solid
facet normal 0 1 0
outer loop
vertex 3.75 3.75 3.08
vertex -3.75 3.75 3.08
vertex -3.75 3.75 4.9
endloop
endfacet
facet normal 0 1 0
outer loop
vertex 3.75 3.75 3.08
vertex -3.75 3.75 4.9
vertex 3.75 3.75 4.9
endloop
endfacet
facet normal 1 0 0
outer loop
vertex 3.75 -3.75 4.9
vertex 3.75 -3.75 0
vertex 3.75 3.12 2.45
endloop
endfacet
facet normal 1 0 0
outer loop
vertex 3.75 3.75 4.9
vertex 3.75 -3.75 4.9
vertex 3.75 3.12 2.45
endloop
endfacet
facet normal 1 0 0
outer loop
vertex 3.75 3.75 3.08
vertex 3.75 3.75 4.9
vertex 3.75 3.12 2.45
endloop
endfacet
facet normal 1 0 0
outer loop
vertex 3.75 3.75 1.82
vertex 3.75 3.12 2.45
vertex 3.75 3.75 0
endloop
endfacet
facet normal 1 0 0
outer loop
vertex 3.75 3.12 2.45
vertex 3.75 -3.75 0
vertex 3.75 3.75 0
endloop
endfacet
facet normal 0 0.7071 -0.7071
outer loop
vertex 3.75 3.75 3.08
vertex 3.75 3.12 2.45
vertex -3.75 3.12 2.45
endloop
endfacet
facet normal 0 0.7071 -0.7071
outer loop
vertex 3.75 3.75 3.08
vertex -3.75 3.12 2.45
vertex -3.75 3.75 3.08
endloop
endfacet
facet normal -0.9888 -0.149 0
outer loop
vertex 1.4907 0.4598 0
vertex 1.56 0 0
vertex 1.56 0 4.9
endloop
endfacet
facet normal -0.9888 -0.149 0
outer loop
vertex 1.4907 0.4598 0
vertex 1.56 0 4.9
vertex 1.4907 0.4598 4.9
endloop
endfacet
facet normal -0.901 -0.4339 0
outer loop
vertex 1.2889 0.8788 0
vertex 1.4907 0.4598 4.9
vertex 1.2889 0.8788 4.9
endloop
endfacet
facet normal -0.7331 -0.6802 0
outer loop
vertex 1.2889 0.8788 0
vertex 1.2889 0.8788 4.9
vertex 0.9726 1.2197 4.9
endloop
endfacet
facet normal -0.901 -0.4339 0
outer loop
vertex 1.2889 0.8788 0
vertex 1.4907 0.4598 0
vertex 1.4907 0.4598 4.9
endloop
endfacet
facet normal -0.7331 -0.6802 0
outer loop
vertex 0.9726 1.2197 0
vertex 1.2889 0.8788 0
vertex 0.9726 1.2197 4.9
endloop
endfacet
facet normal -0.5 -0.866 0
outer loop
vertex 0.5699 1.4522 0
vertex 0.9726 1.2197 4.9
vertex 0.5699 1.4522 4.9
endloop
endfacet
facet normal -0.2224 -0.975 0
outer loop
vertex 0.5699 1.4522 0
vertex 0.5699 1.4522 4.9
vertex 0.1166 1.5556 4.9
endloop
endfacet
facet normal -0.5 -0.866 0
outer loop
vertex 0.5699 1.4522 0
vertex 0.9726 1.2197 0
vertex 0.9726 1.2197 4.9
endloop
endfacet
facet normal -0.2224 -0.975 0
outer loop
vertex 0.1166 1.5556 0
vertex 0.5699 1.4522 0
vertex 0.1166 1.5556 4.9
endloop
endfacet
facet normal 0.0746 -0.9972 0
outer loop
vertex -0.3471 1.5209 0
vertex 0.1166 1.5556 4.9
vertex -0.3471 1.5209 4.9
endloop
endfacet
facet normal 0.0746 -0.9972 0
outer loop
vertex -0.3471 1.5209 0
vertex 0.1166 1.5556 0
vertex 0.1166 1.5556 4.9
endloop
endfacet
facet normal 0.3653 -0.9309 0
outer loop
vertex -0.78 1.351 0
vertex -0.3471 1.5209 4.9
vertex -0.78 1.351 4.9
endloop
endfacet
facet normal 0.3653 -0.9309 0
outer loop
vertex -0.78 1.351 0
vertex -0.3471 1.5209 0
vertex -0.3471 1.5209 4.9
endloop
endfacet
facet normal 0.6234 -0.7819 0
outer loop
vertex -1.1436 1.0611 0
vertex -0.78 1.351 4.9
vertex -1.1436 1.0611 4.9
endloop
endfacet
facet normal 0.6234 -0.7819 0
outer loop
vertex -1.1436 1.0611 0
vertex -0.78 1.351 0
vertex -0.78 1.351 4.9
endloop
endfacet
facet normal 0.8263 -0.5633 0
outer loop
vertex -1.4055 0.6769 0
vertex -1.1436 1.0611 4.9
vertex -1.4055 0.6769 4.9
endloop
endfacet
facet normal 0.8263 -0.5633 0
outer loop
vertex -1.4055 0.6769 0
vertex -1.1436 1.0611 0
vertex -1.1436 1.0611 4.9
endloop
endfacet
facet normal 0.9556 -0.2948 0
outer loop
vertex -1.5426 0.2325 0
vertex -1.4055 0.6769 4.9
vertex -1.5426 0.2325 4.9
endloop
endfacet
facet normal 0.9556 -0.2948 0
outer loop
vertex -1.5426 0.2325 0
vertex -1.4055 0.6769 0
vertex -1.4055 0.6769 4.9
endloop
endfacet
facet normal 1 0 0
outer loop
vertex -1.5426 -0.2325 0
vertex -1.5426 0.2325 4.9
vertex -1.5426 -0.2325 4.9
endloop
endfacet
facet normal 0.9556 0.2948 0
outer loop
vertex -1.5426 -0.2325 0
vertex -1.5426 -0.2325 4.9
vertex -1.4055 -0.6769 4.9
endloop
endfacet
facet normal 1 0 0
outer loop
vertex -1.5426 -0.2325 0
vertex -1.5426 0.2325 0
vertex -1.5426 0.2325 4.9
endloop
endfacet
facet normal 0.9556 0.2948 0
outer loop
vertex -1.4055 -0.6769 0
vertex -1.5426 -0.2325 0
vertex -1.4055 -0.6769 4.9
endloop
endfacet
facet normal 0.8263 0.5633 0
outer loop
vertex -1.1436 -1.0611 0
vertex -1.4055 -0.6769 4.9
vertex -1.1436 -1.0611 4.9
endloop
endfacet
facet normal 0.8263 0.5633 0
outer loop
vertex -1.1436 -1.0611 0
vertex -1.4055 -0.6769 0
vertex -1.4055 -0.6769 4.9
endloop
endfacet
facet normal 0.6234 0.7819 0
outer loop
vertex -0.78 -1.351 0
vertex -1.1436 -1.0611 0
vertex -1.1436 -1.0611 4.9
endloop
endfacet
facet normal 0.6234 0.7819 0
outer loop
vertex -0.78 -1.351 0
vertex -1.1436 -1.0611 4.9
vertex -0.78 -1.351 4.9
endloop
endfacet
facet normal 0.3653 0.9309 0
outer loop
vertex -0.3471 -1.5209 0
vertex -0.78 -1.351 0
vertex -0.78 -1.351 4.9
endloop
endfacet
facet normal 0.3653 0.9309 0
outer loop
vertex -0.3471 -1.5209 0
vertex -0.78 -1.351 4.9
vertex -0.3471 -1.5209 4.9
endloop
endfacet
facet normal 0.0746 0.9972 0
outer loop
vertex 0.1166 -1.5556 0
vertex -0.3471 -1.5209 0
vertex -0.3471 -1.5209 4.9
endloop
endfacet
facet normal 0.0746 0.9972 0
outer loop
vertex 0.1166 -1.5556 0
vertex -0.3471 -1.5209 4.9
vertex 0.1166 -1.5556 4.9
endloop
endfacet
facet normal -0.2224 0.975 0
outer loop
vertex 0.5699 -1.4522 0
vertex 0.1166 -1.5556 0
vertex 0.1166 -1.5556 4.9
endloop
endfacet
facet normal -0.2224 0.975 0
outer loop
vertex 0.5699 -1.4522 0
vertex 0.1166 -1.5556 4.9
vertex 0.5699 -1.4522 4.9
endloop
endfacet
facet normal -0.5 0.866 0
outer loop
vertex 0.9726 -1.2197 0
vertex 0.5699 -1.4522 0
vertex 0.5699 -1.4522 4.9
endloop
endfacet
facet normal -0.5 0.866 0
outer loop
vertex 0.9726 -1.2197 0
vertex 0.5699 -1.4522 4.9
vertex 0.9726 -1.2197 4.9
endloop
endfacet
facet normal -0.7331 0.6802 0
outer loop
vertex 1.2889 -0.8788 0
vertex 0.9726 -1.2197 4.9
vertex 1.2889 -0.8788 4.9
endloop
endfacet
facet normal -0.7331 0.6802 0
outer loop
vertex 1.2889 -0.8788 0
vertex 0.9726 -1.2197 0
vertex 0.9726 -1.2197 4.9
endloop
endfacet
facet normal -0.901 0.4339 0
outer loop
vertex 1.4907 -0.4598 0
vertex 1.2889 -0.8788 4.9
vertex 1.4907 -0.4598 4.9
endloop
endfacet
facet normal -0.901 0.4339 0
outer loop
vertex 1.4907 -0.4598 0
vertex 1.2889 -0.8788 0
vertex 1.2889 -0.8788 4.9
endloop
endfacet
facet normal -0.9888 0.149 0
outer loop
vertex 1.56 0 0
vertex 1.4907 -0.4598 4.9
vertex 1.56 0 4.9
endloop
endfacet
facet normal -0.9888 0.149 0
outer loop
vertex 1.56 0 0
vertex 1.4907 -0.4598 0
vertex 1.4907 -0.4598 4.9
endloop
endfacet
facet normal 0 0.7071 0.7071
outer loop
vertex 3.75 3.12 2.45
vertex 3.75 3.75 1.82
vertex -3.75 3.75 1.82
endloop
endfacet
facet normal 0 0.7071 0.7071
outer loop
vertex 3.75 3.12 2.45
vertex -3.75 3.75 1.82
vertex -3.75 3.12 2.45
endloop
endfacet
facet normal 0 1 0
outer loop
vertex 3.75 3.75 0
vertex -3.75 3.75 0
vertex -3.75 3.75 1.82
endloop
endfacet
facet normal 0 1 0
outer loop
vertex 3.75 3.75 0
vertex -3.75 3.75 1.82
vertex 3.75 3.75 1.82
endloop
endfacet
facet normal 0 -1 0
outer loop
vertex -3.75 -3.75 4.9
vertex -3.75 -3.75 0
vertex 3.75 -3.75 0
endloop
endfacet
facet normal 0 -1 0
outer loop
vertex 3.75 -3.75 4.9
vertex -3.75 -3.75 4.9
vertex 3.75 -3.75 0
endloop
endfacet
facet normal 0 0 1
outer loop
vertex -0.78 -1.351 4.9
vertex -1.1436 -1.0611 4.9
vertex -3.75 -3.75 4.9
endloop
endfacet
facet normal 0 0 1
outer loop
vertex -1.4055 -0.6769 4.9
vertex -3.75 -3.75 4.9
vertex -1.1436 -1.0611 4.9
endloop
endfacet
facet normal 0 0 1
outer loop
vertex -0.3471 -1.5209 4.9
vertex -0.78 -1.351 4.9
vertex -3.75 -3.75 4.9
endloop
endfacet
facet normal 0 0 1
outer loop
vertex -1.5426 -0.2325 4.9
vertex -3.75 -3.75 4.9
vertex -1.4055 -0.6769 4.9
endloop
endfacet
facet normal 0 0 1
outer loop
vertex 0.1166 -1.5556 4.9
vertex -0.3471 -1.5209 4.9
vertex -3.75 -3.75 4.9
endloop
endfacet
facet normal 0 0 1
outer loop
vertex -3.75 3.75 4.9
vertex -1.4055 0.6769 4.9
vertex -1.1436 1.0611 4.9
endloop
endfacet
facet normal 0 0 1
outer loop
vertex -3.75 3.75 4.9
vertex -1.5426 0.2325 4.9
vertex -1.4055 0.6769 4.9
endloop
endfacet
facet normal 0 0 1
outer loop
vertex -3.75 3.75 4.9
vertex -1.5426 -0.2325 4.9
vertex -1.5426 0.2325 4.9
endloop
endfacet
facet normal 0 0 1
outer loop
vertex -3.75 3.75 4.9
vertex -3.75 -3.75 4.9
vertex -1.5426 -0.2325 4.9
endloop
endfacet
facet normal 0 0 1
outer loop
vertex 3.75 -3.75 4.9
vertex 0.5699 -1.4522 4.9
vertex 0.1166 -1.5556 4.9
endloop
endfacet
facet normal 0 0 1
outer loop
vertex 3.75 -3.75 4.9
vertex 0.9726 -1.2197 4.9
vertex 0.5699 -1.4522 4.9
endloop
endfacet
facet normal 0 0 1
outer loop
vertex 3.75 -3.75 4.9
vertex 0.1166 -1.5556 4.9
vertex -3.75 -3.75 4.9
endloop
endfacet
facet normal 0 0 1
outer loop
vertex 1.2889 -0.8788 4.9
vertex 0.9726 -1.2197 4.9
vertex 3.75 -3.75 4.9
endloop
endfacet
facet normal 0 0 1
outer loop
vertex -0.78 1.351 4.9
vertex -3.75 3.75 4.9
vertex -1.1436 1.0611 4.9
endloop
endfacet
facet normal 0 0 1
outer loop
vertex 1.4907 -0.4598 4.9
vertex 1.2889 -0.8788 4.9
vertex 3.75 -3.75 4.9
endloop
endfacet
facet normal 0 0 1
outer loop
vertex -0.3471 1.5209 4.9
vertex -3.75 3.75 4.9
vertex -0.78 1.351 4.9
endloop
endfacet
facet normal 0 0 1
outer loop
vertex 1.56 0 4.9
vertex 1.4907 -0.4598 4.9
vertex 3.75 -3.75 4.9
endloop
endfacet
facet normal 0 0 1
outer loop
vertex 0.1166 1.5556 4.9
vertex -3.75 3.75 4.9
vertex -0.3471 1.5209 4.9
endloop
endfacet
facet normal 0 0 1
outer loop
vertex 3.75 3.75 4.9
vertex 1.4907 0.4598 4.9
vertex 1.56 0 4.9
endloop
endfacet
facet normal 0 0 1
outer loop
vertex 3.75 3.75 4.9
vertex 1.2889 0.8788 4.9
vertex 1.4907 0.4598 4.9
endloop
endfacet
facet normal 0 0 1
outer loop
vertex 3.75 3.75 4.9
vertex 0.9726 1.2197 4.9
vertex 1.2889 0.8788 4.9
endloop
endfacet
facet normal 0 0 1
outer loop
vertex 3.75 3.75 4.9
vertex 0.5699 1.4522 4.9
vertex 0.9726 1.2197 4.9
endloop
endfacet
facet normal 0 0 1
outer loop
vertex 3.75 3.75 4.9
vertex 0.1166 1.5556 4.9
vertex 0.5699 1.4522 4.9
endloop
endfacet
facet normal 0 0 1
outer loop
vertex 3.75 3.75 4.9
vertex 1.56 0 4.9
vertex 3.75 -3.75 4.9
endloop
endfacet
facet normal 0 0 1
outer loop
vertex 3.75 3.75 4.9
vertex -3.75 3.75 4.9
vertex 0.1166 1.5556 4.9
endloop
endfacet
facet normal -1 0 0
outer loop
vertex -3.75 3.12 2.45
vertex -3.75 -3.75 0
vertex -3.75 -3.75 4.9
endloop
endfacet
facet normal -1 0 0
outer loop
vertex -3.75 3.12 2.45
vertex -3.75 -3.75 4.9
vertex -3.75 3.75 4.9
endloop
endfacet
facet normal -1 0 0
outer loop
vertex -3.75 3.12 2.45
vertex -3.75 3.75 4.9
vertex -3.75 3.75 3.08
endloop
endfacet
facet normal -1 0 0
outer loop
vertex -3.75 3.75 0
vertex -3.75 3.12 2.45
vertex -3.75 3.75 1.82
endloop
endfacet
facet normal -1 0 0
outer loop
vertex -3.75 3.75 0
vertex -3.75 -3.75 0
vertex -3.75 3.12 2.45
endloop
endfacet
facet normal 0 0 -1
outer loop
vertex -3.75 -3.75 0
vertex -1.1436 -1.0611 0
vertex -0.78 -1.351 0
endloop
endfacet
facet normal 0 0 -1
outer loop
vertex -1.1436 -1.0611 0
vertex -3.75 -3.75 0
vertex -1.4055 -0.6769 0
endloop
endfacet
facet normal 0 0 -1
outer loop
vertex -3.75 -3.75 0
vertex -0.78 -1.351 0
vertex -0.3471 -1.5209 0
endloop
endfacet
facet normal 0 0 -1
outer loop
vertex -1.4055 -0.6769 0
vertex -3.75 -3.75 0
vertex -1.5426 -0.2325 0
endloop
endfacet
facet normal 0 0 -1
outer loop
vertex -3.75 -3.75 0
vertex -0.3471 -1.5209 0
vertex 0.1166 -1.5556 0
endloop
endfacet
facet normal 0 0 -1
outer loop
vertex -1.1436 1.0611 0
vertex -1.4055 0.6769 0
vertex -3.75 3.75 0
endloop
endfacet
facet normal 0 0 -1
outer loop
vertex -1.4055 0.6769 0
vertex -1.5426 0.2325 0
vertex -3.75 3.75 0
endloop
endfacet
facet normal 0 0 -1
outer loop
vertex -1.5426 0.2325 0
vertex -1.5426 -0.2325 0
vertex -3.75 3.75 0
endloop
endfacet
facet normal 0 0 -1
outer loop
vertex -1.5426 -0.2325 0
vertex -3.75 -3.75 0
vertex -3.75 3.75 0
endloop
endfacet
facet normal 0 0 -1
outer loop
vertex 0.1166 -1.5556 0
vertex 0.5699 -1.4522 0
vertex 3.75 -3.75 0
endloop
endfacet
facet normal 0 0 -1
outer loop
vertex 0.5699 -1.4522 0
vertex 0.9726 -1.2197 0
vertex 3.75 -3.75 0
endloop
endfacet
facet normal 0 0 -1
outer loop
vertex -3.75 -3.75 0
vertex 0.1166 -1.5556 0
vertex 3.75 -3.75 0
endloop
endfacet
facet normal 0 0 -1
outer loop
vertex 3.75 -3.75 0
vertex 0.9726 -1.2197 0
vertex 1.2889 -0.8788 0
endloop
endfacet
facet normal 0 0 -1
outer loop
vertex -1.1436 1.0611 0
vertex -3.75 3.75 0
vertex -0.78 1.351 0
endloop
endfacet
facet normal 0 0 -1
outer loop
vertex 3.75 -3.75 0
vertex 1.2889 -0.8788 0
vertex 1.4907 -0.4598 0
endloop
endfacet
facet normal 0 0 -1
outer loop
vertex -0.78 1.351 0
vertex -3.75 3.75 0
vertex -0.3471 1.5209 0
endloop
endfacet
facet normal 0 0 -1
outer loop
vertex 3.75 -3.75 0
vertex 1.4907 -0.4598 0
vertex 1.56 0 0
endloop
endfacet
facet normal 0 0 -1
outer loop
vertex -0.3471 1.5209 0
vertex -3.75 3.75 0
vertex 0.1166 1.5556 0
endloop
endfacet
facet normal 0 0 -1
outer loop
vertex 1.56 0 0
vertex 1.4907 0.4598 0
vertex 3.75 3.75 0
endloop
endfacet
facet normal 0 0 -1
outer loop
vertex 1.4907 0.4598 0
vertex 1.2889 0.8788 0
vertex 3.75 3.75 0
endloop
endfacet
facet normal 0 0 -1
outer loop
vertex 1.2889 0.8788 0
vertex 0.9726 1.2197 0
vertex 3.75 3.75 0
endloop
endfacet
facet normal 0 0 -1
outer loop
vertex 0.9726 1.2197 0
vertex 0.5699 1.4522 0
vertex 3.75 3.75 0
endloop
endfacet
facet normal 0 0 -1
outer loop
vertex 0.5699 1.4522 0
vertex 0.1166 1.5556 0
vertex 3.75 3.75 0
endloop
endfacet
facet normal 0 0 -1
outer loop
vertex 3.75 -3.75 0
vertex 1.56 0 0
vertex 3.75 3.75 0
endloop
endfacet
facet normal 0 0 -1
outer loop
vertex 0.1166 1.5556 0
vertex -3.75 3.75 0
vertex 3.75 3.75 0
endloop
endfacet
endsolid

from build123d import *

# Parameters (mm, degrees)
SKETCH1_W               = 7.5
SKETCH1_H               = 7.5
SKETCH1_R               = 1.56
BOSS_EXTRUDE1_DEPTH     = 4.9
CUT_EXTRUDE1_DEPTH      = 4.75
CUT_EXTRUDE1_DEPTH_BACK = 4.75


with BuildPart() as part:
    # Sketch1 → Boss-Extrude1 (new body)
    with BuildSketch(Plane.XY):
        Rectangle(SKETCH1_W, SKETCH1_H)
        Circle(SKETCH1_R, mode=Mode.SUBTRACT)
    extrude(amount=BOSS_EXTRUDE1_DEPTH)

    # Sketch5 → Cut-Extrude1 (cut, two sides)
    with BuildSketch(Plane(origin=(0, 0, 0), x_dir=(0, 0, -1), z_dir=(1, 0, 0))) as cut_extrude1_sk:
        Polygon((-2.45, 3.12), (-3.08, 3.75), (-1.82, 3.75), align=None)
    extrude(amount=CUT_EXTRUDE1_DEPTH, mode=Mode.SUBTRACT)
    extrude(cut_extrude1_sk.sketch, amount=-CUT_EXTRUDE1_DEPTH_BACK, mode=Mode.SUBTRACT)


solid = part.part
